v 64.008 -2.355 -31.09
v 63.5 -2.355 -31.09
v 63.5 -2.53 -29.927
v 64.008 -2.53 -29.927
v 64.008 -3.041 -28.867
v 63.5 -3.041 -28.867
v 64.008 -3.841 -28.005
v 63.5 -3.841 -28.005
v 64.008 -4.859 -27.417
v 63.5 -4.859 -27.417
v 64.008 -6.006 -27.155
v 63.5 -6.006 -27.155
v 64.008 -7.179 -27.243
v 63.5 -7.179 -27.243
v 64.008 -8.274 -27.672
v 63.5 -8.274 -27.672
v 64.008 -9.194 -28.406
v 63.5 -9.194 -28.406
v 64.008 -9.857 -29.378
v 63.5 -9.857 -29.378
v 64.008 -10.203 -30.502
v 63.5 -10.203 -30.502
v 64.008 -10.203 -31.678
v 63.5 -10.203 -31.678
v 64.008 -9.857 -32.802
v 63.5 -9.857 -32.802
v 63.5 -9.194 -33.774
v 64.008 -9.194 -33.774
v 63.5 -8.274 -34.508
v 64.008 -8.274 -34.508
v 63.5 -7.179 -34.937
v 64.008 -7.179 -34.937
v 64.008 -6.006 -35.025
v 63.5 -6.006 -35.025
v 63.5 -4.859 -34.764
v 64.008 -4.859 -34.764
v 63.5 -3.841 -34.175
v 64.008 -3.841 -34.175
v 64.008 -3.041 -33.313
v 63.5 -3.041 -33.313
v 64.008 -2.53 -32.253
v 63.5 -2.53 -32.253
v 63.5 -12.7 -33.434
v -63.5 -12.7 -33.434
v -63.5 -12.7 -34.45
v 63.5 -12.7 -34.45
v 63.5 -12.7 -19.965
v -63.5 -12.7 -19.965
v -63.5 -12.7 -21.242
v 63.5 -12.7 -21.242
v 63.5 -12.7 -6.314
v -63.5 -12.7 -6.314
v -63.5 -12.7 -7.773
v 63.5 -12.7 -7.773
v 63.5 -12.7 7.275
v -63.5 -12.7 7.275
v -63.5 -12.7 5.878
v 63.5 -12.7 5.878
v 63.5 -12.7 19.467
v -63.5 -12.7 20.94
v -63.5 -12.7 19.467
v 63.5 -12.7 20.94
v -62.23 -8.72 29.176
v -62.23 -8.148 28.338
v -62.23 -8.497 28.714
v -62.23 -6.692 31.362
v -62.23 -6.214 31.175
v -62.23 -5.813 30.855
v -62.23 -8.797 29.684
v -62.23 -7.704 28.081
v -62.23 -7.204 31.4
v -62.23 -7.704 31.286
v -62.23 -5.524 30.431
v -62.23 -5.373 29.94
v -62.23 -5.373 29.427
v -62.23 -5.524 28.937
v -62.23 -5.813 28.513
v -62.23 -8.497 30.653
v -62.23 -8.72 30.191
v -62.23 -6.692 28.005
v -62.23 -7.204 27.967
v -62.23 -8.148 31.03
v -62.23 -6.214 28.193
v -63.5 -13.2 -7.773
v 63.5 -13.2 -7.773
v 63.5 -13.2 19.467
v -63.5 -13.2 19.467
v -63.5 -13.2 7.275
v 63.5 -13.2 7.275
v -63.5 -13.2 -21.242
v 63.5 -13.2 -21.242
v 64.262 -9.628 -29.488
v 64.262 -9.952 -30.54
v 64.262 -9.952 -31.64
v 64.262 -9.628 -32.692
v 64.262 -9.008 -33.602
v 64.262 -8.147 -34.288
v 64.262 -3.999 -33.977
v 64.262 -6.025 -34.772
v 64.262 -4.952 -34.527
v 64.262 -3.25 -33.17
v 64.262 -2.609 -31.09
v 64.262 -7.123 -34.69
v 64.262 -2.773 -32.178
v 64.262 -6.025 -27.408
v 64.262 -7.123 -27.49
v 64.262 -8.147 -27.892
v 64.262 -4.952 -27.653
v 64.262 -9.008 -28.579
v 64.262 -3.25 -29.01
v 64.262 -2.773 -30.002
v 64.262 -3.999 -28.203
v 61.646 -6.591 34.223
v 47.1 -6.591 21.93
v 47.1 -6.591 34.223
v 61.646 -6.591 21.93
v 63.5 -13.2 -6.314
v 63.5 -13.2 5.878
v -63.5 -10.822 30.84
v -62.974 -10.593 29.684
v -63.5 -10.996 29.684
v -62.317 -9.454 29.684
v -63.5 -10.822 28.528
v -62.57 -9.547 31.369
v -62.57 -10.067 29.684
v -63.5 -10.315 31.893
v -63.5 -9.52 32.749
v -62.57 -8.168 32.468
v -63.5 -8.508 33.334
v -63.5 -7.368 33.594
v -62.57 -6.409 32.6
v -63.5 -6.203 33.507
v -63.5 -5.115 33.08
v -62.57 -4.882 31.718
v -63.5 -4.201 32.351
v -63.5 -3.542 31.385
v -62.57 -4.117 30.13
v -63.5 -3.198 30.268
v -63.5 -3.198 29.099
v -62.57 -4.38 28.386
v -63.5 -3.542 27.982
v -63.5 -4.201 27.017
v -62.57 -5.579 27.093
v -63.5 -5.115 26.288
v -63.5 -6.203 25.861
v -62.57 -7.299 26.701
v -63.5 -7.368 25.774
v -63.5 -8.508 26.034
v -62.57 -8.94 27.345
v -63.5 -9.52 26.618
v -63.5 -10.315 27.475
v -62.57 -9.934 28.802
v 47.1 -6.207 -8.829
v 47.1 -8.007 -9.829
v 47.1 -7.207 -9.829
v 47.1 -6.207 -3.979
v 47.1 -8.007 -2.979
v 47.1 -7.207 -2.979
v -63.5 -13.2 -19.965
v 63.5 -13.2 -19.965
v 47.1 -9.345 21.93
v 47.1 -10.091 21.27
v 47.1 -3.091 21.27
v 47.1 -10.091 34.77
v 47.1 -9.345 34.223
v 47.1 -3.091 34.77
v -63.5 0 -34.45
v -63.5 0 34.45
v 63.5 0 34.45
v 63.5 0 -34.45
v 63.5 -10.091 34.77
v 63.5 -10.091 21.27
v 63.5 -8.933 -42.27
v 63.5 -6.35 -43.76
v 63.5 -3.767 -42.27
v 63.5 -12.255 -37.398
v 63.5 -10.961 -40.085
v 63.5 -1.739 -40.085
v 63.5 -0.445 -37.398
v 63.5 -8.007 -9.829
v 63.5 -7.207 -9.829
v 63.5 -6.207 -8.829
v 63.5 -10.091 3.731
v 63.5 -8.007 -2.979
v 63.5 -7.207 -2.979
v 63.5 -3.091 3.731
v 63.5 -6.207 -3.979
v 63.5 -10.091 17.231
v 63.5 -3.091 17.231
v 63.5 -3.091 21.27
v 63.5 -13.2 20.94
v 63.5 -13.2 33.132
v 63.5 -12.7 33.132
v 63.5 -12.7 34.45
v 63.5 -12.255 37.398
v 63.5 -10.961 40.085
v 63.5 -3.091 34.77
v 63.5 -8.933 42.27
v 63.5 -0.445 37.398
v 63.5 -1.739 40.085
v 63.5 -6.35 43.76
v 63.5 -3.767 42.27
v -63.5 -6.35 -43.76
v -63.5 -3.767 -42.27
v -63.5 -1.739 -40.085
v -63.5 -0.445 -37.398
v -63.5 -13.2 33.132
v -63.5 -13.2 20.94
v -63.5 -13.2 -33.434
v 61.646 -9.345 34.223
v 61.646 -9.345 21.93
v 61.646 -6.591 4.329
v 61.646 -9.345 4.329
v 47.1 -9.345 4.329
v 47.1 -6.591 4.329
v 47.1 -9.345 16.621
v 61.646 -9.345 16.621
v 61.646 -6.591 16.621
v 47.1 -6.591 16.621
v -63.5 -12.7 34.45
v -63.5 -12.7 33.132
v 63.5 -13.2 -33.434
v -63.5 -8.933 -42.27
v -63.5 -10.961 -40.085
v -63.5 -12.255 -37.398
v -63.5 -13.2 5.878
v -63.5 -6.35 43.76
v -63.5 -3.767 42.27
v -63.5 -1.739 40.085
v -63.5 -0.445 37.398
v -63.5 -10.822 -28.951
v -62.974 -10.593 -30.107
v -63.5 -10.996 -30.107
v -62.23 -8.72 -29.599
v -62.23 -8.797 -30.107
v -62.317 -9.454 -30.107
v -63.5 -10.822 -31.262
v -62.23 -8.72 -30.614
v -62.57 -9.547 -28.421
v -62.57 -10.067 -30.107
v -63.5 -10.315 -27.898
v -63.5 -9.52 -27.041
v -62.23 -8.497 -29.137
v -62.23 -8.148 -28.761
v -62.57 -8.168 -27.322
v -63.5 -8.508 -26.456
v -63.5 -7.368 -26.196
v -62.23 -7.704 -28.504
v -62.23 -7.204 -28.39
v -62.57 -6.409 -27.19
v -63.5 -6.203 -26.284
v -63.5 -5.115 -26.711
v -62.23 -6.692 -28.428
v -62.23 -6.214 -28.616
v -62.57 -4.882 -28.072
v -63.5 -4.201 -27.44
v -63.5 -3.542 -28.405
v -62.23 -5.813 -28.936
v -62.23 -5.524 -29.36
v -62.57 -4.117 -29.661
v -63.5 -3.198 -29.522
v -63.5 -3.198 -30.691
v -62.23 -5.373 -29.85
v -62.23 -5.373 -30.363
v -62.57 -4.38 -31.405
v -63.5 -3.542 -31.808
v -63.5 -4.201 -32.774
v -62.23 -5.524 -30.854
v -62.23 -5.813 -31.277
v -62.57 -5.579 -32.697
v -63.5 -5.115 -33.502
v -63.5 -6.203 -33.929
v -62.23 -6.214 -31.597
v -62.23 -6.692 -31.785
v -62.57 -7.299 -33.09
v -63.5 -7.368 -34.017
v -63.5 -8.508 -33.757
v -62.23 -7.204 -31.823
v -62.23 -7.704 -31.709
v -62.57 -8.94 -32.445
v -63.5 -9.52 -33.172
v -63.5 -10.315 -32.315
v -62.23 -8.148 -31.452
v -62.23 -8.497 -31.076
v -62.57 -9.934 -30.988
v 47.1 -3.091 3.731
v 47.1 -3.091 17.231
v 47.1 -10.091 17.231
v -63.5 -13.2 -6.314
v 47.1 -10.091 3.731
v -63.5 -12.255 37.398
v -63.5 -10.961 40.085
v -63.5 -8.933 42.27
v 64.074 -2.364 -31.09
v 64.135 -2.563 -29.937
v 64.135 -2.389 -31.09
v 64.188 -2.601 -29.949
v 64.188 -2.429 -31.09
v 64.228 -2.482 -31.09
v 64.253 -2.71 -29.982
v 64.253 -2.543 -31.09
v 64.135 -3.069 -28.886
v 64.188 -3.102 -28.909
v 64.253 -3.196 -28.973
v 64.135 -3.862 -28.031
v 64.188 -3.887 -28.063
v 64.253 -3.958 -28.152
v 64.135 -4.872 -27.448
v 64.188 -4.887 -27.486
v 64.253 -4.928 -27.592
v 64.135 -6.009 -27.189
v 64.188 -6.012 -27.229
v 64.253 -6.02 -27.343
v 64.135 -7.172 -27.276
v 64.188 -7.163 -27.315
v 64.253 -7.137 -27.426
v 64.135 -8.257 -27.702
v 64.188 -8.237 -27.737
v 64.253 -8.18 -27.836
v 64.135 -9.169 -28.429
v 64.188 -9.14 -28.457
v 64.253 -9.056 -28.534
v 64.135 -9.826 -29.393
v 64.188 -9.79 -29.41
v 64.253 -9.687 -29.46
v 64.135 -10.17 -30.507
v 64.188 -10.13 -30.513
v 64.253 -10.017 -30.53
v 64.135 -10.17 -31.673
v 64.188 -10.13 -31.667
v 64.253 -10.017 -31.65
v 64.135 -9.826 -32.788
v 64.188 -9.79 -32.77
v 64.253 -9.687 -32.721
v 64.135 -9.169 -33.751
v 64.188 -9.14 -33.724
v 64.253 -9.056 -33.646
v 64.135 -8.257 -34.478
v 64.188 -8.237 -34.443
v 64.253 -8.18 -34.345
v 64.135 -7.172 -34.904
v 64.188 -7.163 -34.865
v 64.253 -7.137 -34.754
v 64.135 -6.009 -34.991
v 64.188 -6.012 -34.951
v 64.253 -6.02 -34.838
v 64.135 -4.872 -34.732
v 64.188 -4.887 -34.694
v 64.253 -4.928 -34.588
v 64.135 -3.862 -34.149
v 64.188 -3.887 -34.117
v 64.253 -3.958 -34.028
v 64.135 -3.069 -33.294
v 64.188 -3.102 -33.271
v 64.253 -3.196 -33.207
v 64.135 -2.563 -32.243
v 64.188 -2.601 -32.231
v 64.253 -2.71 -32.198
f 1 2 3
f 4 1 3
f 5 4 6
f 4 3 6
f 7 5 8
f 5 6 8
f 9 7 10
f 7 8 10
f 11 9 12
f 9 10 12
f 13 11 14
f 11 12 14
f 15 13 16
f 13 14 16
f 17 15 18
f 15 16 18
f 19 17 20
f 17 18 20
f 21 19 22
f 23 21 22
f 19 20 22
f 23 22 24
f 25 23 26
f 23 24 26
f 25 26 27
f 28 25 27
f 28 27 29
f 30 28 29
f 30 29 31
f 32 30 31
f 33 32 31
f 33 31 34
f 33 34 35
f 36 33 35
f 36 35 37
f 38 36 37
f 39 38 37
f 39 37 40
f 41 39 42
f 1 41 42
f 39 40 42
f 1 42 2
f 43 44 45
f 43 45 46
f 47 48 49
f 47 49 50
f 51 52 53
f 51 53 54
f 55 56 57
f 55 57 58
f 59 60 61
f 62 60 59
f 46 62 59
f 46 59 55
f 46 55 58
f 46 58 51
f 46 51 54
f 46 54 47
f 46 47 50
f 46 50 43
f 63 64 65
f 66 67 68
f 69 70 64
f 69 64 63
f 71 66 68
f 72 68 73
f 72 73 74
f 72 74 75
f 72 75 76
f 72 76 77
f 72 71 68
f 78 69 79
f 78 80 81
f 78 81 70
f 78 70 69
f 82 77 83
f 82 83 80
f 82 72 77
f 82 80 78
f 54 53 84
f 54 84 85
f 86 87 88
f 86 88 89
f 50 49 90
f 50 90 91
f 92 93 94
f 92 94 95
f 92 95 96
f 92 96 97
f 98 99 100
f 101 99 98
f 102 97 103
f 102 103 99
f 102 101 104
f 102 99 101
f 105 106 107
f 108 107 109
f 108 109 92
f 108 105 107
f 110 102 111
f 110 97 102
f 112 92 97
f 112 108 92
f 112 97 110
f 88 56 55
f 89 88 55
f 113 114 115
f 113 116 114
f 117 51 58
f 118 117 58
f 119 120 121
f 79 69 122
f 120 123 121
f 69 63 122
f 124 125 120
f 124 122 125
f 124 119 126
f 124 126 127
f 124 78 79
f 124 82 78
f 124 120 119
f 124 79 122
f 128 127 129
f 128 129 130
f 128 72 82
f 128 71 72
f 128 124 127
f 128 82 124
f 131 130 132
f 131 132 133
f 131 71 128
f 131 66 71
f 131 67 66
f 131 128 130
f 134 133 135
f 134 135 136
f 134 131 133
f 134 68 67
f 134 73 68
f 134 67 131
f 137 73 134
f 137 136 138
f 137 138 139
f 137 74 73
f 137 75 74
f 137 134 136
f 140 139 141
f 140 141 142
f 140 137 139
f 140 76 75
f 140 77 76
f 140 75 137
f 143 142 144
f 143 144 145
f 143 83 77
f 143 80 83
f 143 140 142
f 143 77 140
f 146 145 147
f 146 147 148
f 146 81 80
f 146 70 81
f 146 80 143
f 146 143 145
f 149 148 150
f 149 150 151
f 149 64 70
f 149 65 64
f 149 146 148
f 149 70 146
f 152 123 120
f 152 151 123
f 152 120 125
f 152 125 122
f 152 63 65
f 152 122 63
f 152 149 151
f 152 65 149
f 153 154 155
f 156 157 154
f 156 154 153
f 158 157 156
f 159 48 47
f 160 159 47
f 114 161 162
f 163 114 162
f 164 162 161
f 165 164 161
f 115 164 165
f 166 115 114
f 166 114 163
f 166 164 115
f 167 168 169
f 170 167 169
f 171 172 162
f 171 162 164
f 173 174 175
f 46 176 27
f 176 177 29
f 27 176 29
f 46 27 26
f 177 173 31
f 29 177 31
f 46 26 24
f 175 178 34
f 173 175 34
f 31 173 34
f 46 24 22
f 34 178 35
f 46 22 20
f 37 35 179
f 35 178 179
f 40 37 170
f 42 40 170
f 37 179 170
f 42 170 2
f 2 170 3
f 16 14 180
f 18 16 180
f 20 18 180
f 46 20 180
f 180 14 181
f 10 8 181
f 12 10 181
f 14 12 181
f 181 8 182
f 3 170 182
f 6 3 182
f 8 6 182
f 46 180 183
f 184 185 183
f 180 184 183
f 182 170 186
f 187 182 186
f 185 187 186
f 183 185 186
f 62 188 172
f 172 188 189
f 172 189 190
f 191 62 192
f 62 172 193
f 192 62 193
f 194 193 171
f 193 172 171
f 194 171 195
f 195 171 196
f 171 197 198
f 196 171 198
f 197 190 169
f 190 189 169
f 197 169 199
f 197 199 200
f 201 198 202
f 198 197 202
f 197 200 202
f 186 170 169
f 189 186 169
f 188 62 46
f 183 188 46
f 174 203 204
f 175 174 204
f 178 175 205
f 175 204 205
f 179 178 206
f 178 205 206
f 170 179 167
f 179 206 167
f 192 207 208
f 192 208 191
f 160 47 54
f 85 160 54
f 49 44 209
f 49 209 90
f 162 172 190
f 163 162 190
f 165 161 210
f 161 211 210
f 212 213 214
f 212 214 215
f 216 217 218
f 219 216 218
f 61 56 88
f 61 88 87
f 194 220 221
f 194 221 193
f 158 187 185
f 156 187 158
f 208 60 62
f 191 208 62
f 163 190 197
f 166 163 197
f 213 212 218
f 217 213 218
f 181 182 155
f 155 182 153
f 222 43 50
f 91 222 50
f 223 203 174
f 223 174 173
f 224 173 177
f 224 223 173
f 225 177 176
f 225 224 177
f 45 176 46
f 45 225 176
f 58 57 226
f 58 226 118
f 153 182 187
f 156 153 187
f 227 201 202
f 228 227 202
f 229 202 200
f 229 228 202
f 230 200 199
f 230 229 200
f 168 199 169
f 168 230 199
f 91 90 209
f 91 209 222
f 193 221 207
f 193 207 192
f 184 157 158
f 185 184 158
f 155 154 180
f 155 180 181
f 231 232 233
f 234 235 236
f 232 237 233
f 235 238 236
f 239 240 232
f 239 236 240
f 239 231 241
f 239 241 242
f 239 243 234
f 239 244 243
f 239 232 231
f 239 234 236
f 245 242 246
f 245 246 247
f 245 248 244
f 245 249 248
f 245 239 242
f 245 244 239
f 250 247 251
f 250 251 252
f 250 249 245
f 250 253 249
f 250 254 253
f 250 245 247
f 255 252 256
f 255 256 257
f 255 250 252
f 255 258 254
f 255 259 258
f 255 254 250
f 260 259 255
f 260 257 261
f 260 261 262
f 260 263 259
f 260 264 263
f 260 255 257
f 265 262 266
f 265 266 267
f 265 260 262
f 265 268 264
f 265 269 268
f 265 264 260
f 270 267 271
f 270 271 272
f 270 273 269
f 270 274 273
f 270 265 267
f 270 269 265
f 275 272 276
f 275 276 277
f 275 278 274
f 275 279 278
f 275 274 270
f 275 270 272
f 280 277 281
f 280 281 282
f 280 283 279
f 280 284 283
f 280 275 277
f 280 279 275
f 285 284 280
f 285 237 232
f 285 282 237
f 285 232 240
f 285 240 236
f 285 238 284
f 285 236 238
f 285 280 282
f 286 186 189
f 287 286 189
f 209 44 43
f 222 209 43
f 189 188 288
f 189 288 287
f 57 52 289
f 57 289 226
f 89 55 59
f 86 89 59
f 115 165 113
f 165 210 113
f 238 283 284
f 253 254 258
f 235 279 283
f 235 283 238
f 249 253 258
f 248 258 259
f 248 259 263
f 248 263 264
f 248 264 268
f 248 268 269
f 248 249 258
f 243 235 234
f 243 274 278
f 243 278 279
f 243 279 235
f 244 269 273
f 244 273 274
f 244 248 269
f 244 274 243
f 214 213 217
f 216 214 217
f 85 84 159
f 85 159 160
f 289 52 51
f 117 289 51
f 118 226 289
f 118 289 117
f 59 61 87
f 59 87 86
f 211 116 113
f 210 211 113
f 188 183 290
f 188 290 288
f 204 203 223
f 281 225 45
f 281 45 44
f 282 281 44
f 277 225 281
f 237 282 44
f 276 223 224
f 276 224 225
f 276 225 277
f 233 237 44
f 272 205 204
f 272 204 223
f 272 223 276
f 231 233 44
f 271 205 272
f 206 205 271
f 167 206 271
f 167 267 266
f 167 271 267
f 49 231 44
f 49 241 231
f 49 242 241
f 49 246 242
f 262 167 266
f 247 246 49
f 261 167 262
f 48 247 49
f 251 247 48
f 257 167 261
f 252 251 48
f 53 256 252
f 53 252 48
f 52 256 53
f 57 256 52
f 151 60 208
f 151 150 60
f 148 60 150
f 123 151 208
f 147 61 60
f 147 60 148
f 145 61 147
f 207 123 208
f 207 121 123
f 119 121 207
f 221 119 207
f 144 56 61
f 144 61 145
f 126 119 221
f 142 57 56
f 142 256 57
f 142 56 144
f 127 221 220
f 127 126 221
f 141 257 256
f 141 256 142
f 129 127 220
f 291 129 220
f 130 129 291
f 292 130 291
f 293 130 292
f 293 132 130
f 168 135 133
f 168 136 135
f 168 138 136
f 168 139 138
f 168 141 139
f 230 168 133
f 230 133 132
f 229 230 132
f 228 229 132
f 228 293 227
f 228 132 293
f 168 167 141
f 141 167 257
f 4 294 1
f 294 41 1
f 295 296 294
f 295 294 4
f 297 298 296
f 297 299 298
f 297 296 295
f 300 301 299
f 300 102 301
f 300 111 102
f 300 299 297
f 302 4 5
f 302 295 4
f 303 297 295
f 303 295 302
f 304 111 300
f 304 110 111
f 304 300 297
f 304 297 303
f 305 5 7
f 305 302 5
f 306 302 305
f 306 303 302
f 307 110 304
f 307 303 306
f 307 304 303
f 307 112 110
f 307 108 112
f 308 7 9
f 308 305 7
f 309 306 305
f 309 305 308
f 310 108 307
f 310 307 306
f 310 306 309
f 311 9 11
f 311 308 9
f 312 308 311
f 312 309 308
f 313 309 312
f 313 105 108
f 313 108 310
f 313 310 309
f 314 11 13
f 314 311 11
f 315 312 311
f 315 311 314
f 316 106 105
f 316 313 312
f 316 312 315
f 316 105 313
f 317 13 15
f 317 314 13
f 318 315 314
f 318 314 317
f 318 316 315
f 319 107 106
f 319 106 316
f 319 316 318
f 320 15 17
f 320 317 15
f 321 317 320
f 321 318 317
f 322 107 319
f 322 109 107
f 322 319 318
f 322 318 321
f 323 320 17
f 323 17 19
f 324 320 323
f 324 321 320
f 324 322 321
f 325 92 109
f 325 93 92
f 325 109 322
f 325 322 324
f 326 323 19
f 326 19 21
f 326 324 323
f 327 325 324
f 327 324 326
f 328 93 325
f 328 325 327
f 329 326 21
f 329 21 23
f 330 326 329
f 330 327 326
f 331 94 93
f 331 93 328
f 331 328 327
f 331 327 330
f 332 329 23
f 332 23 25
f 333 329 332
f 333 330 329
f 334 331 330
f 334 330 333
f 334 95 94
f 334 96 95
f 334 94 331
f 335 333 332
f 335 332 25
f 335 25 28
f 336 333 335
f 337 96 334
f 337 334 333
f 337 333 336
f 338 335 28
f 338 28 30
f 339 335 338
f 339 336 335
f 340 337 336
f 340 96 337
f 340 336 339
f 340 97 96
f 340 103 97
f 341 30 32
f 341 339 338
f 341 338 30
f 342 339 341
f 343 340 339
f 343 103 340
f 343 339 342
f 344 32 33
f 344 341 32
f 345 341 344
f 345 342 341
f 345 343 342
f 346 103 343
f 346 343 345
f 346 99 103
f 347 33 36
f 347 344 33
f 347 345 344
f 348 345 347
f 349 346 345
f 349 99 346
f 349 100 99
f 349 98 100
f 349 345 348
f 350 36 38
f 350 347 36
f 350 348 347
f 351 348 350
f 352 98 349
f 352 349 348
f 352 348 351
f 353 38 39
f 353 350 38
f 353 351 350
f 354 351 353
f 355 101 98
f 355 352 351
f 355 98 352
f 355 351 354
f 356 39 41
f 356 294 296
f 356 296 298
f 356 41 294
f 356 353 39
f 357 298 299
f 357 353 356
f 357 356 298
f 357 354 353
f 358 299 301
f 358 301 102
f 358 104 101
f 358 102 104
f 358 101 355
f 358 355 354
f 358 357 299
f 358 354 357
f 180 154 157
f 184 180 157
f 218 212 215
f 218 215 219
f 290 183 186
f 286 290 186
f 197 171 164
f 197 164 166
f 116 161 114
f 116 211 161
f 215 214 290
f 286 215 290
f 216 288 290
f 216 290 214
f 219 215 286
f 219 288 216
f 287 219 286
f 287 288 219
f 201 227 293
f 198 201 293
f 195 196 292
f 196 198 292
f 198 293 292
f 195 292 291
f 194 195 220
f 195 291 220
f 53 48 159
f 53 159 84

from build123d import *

# Parameters (mm, degrees)
F0_W        = 127
F0_H        = 88.9
F1_DEPTH    = 12.7
F2_T1_DEPTH = 177
F3_W        = 1.8
F3_H        = 6.85
F4_DEPTH    = 16.4
F3_W_2      = 7
F3_H_2      = 13.5
F3_W_3      = 2.7532497272
F3_H_3      = 12.2928316705
F5_DEPTH    = 16.4
F6_SIZE     = 1
F7_DEPTH    = 2.794
F8_DEPTH    = 1.8542
F3_R        = 3.9463270772
F9_DEPTH    = 0.762
F10_R       = 0.254
F13_W       = 127
F13_H       = 12.192
F14_DEPTH   = 0.5
F15_R       = 3.9211509086
F16_DEPTH   = 1.27


# Not quite as in the source:
# - a fillet or chamfer that OpenCascade refuses, or shapes differently, is made with other operations: its cross-section is extruded or revolved along the edge and cut away or added
# - the program builds the solid bodies; features that only make, move or delete a surface that nothing else refers to are left out


with BuildPart() as f1:
    # F0 (on Front) → F1 (new body)
    with BuildSketch(Plane.XZ):
        Rectangle(F0_W, F0_H)
    extrude(amount=F1_DEPTH)

    # F2: fillet of radius 10 on 4 edges, made by hand

    # F2_s2 → F2_t1 (cut)
    with BuildSketch(Plane.YZ.offset(-88.5)):
        with BuildLine():
            ThreePointArc((-2.7, 44.45), (-9.7710678119, 41.5210678119), (-12.7, 34.45))
            Line((-12.7, 34.45), (-12.7, 44.45))
            Line((-12.7, 44.45), (-2.7, 44.45))
        make_face()
        with BuildLine():
            ThreePointArc((-10, 44.45), (-2.9289321881, 41.5210678119), (0, 34.45))
            Line((0, 34.45), (0, 44.45))
            Line((0, 44.45), (-10, 44.45))
        make_face()
        with BuildLine():
            ThreePointArc((-2.7, -44.45), (-9.7710678119, -41.5210678119), (-12.7, -34.45))
            Line((-12.7, -34.45), (-12.7, -44.45))
            Line((-12.7, -44.45), (-2.7, -44.45))
        make_face()
        with BuildLine():
            ThreePointArc((-10, -44.45), (-2.9289321881, -41.5210678119), (0, -34.45))
            Line((0, -34.45), (0, -44.45))
            Line((0, -44.45), (-10, -44.45))
        make_face()
    extrude(amount=F2_T1_DEPTH, mode=Mode.SUBTRACT)

    # F3 (on face) → F4 (cut)
    with BuildSketch(Plane.YZ.offset(63.5)):
        with Locations((-7.1068273082, -6.4043554038)):
            Rectangle(F3_W, F3_H)
    extrude(amount=-F4_DEPTH, mode=Mode.SUBTRACT)

    # F3 (on face) → F5 (cut)
    with BuildSketch(Plane.YZ.offset(63.5)):
        with Locations((-6.591425851, 10.4809925538)):
            Rectangle(F3_W_2, F3_H_2)
        with Locations((-7.9680507146, 10.4750713799)):
            Rectangle(F3_W_3, F3_H_3, mode=Mode.SUBTRACT)
        with Locations((-6.591425851, 28.0195952505)):
            Rectangle(F3_W_2, F3_H_2)
        with Locations((-7.9680507146, 28.0764119234)):
            Rectangle(F3_W_3, F3_H_3, mode=Mode.SUBTRACT)
    extrude(amount=-F5_DEPTH, mode=Mode.SUBTRACT)

    # F6
    f6_edges = [f1.edges().sort_by_distance(p)[0] for p in [
        (55.3, -6.206827, -2.979355),
        (55.3, -6.206827, -9.829355),
    ]]
    chamfer(f6_edges, length=F6_SIZE)

    # F7 (add): faces of the model
    f7_faces = [f1.faces().sort_by_distance(p)[0] for p in [
        (63.5, -7.9680507146, 10.4750713799),
        (63.5, -7.9680507146, 28.0764119234),
    ]]
    extrude(f7_faces, amount=-F7_DEPTH)

    # F8 (cut): faces of the model
    f8_faces = [f1.faces().sort_by_distance(p)[0] for p in [
        (63.5, -7.9680507146, 10.4750713799),
        (63.5, -7.9680507146, 28.0764119234),
    ]]
    extrude(f8_faces, amount=-F8_DEPTH, mode=Mode.SUBTRACT)

    # F3 (on face) → F9 (join)
    with BuildSketch(Plane.YZ.offset(63.5)):
        with Locations((-6.3012135215, -31.0900993645)):
            Circle(F3_R)
    extrude(amount=F9_DEPTH)

    # F10
    f10_edges = [f1.edges().sort_by_distance(p)[0] for p in [
        (64.262, -10.247541, -31.090099),
    ]]
    fillet(f10_edges, radius=F10_R)

    # F13 (on face) → F14 (join)
    with BuildSketch(Plane.XZ.offset(12.7)):
        with Locations((0, 27.0355174699)):
            Rectangle(F13_W, F13_H)
        with Locations((-2.0266e-06, 13.3711864791)):
            Rectangle(F13_W, F13_H)
        with Locations((-2.0266e-06, -0.2175037199)):
            Rectangle(F13_W, F13_H)
        with Locations((-2.0266e-06, -13.8689222195)):
            Rectangle(F13_W, F13_H)
        with Locations((-2.0266e-06, -27.337996141)):
            Rectangle(F13_W, F13_H)
    extrude(amount=F14_DEPTH)

    # F15 (on face) → F16 (cut)
    with BuildSketch(Plane(origin=(-63.5, 0, 0), x_dir=(0, -1, 0), z_dir=(-1, 0, 0))):
        with Locations((7.0751463063, -30.106594786)):
            Circle(F15_R)
        with Locations((7.0751463063, 29.6837498702)):
            Circle(F15_R)
    extrude(amount=-F16_DEPTH, mode=Mode.SUBTRACT)

    # F17: fillet of radius 2.54 on 2 edges, made by hand

    # F17_s1 → F17_t2 (revolve)
    with BuildSketch(Plane.XY.offset(-30.106594786)):
        with BuildLine():
            ThreePointArc((-63.5, -10.9962972149), (-62.5702954744, -10.0665926893), (-62.23, -8.7965926893))
            Line((-62.23, -8.7965926893), (-62.23, -10.9962972149))
            Line((-62.23, -10.9962972149), (-63.5, -10.9962972149))
        make_face()
    revolve(axis=Axis((-62.23, -7.0751463063, -30.106594786), (-1, 0, 0)))

    # F17_s3 → F17_t4 (revolve)
    with BuildSketch(Plane.XY.offset(29.6837498702)):
        with BuildLine():
            ThreePointArc((-63.5, -10.9962972149), (-62.5702954744, -10.0665926893), (-62.23, -8.7965926893))
            Line((-62.23, -8.7965926893), (-62.23, -10.9962972149))
            Line((-62.23, -10.9962972149), (-63.5, -10.9962972149))
        make_face()
    revolve(axis=Axis((-62.23, -7.0751463063, 29.6837498702), (-1, 0, 0)))


solid = f1.part
